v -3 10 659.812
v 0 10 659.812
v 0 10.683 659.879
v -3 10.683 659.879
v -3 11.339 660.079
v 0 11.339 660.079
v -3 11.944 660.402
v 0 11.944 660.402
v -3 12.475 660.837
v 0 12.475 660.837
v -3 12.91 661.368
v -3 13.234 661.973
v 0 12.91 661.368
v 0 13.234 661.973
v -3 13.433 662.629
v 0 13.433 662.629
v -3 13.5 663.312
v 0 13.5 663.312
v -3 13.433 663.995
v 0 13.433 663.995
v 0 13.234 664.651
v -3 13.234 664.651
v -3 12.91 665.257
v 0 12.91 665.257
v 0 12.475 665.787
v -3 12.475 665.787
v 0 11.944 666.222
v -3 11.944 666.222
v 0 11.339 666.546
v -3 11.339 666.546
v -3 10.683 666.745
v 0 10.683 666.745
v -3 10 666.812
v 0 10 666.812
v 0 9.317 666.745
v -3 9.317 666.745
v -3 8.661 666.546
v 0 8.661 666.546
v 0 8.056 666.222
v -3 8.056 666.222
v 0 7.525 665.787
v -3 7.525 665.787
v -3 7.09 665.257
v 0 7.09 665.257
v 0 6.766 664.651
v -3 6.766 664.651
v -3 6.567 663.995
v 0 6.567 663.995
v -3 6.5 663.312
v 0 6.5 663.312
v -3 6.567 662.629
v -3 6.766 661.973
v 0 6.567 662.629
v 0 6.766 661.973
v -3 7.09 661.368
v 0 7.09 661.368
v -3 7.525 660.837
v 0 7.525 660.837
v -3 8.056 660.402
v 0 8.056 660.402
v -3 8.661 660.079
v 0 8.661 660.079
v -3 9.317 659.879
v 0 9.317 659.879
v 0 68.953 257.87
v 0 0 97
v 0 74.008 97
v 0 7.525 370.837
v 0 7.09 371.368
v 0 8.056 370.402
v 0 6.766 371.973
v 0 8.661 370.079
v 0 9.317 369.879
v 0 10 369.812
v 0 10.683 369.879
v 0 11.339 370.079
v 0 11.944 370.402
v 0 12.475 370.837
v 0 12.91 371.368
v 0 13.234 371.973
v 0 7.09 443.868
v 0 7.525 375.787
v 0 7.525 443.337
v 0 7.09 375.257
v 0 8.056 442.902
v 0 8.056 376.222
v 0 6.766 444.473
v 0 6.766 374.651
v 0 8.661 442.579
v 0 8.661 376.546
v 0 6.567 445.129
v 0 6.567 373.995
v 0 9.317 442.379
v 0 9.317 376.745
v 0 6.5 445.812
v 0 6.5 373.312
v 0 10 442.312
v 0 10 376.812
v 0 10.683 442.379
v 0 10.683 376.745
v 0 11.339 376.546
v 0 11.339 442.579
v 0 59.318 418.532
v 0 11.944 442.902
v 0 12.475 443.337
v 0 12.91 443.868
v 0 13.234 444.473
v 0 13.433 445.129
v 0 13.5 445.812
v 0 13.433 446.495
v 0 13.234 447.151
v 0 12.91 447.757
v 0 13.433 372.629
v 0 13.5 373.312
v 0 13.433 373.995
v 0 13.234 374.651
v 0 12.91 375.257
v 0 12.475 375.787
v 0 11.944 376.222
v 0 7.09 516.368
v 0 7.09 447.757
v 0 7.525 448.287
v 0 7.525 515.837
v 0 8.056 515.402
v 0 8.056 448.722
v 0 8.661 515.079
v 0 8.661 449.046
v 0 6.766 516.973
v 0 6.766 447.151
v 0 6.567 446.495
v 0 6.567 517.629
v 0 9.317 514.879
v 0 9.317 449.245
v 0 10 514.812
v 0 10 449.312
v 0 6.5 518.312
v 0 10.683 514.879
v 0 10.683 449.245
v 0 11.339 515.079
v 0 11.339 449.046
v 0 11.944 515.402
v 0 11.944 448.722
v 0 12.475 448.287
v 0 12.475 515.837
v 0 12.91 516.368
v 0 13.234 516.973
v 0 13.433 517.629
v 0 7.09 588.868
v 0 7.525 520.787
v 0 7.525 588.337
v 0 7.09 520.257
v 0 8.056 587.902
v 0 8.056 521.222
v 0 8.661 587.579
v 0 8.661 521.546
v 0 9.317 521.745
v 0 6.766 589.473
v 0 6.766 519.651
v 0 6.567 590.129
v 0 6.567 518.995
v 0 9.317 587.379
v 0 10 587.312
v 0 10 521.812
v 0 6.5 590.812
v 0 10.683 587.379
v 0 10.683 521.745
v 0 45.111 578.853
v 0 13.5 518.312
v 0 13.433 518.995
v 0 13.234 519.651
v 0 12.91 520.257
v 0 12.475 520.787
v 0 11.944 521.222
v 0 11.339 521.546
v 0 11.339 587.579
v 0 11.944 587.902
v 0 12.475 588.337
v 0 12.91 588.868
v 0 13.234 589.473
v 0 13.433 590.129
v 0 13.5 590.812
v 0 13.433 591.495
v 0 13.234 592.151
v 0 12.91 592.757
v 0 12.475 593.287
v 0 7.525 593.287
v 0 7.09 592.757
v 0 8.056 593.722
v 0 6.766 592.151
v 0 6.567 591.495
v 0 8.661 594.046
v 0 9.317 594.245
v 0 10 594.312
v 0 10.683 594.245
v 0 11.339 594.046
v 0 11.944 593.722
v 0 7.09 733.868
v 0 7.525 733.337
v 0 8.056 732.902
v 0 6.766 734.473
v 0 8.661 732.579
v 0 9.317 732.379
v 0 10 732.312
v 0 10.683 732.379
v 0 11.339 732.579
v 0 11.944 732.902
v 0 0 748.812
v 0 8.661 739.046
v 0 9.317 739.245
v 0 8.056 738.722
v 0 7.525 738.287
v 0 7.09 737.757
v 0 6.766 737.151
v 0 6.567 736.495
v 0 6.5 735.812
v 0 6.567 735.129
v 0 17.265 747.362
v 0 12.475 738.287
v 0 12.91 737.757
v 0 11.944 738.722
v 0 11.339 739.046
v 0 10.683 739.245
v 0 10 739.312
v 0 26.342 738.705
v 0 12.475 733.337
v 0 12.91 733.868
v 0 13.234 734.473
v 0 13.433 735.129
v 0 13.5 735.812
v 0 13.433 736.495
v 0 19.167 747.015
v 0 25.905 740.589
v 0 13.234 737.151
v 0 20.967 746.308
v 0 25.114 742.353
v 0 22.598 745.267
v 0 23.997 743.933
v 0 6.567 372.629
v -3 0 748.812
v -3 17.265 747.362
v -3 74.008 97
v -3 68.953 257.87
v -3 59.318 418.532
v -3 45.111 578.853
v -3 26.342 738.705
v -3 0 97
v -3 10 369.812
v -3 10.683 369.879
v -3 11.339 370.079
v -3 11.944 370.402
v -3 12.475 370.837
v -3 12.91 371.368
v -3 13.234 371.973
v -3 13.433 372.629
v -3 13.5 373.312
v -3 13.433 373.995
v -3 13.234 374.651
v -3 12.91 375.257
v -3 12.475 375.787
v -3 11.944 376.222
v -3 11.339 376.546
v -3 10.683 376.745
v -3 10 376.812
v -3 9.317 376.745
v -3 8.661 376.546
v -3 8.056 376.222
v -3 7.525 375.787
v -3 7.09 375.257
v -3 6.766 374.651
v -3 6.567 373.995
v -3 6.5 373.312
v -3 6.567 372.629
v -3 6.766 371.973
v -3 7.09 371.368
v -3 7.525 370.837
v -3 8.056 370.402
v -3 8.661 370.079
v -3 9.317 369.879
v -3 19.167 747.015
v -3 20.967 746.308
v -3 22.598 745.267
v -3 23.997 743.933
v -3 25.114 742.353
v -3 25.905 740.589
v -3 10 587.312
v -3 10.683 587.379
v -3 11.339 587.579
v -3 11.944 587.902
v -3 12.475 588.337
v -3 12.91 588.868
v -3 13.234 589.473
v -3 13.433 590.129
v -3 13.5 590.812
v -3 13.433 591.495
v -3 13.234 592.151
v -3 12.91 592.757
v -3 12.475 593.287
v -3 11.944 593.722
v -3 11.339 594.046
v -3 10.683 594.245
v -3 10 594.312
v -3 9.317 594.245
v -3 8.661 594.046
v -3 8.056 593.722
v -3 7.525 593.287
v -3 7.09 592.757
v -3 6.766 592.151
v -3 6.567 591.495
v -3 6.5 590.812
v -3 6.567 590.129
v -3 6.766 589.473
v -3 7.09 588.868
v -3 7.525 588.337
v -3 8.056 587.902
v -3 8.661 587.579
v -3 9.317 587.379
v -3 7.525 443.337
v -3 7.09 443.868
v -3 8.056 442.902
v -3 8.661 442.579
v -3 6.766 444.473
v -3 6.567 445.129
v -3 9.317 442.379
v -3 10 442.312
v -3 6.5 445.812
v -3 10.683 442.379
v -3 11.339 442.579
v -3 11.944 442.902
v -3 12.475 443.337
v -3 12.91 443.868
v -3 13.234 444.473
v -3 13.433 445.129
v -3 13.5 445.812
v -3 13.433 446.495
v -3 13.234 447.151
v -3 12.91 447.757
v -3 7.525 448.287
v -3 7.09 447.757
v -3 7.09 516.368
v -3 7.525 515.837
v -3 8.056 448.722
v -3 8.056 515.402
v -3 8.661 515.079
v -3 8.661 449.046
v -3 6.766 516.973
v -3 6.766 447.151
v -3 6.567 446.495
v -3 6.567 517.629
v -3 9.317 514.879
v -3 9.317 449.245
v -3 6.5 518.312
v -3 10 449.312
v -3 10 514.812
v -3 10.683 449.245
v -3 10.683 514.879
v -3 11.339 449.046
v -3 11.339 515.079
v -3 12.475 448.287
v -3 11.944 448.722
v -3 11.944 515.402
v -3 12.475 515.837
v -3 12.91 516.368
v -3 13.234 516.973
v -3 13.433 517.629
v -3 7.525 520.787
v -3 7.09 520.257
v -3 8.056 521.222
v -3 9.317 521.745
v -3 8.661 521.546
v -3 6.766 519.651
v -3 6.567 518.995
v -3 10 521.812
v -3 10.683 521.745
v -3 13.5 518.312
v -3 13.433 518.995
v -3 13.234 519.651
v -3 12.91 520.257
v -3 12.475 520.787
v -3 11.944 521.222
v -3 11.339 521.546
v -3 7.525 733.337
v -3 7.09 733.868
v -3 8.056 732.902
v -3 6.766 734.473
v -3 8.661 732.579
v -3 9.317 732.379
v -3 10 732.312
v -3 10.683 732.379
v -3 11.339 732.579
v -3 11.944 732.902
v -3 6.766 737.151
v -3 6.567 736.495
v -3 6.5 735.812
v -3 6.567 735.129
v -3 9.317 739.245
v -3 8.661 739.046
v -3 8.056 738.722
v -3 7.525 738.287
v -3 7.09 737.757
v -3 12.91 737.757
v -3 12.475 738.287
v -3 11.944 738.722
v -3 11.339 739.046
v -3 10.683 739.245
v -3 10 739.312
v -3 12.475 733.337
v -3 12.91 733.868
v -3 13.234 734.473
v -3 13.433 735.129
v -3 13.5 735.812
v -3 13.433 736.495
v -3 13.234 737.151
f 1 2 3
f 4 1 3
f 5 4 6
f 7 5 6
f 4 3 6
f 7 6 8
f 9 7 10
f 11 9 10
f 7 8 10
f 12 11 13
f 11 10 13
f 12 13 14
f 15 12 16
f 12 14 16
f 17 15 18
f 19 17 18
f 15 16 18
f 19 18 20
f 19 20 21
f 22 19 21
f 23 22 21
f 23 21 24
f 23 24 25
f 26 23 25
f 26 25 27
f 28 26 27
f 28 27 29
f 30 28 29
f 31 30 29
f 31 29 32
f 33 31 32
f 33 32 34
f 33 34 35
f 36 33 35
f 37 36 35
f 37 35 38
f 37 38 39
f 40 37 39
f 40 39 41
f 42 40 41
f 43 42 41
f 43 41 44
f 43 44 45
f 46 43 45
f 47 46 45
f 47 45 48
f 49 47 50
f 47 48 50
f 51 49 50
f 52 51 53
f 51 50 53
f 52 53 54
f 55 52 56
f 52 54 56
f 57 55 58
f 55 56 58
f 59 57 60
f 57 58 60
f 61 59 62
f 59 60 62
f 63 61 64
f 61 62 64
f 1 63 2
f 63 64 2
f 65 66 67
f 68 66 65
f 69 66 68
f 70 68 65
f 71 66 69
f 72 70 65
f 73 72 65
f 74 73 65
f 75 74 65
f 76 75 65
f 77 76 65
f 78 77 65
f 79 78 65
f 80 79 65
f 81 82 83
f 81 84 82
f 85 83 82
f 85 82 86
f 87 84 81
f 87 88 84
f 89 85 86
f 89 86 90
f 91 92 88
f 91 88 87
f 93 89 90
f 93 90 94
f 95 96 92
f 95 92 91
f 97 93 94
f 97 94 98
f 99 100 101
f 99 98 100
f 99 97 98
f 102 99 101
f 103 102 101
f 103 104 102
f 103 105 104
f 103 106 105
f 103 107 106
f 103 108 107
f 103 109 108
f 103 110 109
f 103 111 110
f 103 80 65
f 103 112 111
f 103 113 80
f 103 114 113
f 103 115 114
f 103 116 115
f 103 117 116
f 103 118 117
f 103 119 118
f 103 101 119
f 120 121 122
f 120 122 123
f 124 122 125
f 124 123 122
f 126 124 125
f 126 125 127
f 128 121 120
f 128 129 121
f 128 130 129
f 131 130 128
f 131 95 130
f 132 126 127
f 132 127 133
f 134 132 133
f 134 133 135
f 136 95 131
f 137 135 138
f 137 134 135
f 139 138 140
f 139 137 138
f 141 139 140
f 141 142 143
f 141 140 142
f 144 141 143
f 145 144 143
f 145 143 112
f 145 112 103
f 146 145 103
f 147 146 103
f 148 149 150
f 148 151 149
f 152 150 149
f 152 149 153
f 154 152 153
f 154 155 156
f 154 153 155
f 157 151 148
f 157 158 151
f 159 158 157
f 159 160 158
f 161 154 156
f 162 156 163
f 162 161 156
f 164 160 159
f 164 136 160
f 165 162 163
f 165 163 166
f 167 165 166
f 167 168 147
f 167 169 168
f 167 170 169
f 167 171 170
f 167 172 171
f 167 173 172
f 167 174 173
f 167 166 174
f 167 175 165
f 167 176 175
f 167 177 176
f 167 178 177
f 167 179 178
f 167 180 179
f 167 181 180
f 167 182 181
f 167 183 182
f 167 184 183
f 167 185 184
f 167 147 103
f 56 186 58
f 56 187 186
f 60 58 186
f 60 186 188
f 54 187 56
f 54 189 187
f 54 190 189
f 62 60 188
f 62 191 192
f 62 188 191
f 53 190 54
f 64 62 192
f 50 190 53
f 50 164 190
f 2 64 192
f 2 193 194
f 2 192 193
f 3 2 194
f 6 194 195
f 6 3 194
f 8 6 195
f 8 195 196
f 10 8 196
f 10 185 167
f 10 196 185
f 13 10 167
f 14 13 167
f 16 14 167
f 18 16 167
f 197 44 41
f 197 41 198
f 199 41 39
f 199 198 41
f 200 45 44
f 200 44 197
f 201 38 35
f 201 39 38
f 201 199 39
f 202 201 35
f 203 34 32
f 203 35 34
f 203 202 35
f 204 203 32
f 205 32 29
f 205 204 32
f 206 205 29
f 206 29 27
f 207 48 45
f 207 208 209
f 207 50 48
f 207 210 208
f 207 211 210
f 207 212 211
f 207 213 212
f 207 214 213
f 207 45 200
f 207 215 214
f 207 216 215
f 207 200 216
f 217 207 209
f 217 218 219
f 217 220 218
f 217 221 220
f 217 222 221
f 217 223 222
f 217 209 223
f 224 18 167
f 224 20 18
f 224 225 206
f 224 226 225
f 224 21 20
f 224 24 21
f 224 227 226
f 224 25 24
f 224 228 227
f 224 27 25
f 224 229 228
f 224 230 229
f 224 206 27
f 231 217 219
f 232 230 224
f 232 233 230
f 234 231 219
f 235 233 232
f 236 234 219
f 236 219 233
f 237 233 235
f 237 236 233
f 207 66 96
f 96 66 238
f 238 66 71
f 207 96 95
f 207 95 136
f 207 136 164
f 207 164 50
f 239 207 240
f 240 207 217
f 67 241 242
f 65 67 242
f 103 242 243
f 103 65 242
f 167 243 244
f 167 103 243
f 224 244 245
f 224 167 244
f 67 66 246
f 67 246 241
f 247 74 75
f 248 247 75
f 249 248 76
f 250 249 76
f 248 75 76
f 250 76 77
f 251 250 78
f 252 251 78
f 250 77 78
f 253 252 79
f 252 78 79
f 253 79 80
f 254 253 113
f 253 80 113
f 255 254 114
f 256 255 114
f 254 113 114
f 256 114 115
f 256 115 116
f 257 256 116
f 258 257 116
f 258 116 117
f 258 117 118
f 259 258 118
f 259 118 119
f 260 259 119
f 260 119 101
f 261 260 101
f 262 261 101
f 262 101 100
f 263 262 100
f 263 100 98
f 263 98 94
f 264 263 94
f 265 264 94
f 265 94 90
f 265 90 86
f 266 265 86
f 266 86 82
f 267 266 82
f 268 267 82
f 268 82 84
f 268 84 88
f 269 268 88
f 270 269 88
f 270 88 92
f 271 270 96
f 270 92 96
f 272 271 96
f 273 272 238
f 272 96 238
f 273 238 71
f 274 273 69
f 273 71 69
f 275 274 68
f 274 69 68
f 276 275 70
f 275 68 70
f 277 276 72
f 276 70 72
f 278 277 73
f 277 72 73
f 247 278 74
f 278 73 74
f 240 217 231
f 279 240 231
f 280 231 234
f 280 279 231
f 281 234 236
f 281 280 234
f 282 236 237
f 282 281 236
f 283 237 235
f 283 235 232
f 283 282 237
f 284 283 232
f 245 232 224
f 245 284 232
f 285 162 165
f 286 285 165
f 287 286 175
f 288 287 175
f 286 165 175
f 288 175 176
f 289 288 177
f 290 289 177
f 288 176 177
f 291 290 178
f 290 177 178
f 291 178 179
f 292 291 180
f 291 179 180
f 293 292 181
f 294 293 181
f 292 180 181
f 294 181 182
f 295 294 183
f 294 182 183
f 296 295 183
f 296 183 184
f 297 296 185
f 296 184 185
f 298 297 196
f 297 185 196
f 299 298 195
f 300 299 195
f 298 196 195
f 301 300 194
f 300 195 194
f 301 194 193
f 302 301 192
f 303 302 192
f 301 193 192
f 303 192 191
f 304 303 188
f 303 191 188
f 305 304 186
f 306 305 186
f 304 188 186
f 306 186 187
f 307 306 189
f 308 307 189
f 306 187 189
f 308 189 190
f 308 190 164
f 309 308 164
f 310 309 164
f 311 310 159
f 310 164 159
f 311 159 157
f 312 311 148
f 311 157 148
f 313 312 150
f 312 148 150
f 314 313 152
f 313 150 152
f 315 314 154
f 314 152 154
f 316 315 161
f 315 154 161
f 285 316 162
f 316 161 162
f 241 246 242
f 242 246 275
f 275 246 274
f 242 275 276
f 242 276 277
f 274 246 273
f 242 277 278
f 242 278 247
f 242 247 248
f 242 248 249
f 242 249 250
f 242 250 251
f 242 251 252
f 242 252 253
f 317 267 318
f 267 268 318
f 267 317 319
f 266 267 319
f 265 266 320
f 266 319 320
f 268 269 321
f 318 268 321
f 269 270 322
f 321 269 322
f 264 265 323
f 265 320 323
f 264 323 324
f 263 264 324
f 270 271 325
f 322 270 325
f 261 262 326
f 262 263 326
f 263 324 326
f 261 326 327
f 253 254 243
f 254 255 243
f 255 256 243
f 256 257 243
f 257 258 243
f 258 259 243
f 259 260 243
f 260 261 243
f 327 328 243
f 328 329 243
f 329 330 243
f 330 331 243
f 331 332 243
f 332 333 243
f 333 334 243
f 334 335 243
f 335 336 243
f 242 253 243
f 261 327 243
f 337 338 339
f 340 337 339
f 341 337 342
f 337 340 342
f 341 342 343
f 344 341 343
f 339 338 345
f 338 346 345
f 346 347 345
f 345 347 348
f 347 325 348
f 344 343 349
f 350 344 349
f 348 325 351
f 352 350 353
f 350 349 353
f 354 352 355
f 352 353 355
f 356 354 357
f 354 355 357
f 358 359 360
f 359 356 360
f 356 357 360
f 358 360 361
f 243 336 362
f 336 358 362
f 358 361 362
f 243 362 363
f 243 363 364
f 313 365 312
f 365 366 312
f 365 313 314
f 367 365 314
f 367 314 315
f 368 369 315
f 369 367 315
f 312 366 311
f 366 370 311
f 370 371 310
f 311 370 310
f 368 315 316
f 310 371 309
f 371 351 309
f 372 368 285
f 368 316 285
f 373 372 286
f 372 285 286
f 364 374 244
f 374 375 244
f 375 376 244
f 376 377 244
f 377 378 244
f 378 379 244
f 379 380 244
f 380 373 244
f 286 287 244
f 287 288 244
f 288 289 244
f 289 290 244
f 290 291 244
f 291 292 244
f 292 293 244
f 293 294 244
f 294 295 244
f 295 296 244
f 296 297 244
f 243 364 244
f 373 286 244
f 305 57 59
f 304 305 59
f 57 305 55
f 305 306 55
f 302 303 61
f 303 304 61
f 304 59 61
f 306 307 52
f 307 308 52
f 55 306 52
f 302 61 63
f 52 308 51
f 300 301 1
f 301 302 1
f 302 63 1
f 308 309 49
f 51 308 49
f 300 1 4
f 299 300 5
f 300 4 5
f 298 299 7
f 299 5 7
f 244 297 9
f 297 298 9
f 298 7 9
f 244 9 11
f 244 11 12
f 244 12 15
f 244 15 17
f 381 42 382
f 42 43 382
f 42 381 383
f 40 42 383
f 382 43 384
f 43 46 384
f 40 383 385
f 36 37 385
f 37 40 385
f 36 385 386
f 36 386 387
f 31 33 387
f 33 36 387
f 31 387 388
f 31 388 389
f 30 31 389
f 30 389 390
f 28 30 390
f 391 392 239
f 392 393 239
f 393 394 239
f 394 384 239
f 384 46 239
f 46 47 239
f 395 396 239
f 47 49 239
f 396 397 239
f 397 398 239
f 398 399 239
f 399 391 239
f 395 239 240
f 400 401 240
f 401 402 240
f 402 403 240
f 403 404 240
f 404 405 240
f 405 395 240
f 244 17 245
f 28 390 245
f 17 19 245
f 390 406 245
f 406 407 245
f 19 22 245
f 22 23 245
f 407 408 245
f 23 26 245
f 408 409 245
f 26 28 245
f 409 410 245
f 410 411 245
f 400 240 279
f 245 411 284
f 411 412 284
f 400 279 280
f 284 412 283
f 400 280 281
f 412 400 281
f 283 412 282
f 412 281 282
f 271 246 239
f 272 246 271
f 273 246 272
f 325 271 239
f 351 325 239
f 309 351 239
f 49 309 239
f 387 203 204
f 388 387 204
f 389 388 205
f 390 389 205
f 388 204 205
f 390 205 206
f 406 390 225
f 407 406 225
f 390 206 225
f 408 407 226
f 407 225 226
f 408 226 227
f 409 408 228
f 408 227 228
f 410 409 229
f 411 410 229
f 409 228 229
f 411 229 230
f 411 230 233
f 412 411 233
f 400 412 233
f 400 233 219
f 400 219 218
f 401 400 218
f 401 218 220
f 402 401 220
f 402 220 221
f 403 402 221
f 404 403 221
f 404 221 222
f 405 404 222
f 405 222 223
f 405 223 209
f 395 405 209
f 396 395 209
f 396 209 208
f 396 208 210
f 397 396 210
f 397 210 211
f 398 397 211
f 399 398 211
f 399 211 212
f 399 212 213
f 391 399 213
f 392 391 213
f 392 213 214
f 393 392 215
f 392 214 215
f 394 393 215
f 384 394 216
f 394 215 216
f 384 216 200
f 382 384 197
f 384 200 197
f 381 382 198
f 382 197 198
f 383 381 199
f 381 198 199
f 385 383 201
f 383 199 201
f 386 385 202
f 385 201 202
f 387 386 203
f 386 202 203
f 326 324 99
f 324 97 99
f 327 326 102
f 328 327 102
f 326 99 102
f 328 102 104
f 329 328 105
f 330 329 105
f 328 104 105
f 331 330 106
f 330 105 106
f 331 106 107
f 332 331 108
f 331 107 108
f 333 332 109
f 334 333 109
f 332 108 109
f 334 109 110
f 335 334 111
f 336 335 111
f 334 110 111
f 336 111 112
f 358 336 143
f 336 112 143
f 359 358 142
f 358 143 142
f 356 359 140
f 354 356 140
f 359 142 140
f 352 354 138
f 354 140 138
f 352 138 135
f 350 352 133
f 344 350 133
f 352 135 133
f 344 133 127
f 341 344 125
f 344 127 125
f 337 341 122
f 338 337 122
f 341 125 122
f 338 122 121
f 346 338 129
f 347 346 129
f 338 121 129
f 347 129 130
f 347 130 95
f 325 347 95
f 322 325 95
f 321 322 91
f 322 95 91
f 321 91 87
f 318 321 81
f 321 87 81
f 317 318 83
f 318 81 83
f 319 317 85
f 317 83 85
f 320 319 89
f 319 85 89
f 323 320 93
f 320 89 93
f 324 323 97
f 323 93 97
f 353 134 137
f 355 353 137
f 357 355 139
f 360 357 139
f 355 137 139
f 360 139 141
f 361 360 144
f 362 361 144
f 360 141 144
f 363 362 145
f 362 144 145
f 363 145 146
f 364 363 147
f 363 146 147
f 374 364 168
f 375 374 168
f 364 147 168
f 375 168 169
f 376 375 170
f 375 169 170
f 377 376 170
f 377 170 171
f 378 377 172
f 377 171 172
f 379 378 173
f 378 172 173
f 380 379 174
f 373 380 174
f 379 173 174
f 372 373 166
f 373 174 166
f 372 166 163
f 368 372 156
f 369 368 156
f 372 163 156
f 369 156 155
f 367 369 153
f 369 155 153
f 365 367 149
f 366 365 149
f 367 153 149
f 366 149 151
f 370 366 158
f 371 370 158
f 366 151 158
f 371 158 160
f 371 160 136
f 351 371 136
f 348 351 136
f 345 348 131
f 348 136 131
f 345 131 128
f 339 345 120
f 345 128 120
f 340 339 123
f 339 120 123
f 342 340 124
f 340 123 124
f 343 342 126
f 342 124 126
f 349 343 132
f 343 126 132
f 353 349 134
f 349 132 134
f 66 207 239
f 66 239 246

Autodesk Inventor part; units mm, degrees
ref_plane "YZ Plane" through (0, 0, 0) normal (1, 0, 0) x (0, 1, 0)
ref_plane "XZ Plane" through (0, 0, 0) normal (0, 1, 0) x (-1, 0, 0)
ref_plane "XY Plane" through (0, 0, 0) normal (0, 0, 1) x (1, 0, 0)
sketch "Sketch1" plane through (0, 0, 0) normal (1, 0, 0) x (0, 1, 0)
  line L0 (25, 748.8121) -> (0, 748.8121)
  line L1 (0, 748.8121) -> (0, -748.8121)
  line L2 (0, -748.8121) -> (25, -748.8121)
  arc A0 (25, -748.8121) -> (25, 748.8121) centre (-5575.159, 0) ccw
  line L3 (0, 748.8121) -> (25.2835, 746.689)
  line L4 (0, -748.8121) -> (25.2835, -746.689)
  line L5 (0, 97) -> (74.0083, 97)
  point P0 (0, 0)
  point P1 (0, 0)
  dimension "d2" = 25
  dimension "d3" = 5650
  dimension "d7" = 85.2
  dimension "d8" = 85.2
  dimension "d33" = 97
  dimension "d34" = 651.812
extrude "Plate1" add sketch "Sketch1" against normal blind 3 contours L3 A0 L5 L1
fillet "Corner Round3" radius 10 1 edges at (-1.5, 25.2835, 746.689)
sketch "Sketch4" plane through (0, 0, 0) normal (1, 0, 0) x (0, 0, -1)
  circle A0 centre (-735.8121, 10) radius 3.5
  line L0 (-748.8121, 0) -> (-97, 0) projected
  point P0 (0, 0)
  dimension "d23" = 7
  dimension "d25" = 10
  dimension "d32" = 13
extrude "Extrusion1" cut sketch "Sketch4" against normal through all
pattern_linear "Rectangular Pattern2" count 6 spacing 72.5 along (0, 0, -1) of "Extrusion1"
equation "\"d4\" = Thickness"
equation "\"BendReliefWidth\" = Thickness"
equation "\"BendReliefDepth\" = 0.5 * Thickness"
equation "\"CornerReliefSize\" = 4 * Thickness"
equation "\"MinimumRemnant\" = 2 * Thickness"
equation "\"TransitionRadius\" = BendRadius"
equation "\"JacobiRadiusSize\" = BendRadius"
equation "\"GapSize\" = Thickness"
equation "\"Thickness\" = 3"
equation "\"BendRadius\" = 5"
properties part number "MSC 812 TOP SUPPORT GILLS" material "Stainless Steel"
